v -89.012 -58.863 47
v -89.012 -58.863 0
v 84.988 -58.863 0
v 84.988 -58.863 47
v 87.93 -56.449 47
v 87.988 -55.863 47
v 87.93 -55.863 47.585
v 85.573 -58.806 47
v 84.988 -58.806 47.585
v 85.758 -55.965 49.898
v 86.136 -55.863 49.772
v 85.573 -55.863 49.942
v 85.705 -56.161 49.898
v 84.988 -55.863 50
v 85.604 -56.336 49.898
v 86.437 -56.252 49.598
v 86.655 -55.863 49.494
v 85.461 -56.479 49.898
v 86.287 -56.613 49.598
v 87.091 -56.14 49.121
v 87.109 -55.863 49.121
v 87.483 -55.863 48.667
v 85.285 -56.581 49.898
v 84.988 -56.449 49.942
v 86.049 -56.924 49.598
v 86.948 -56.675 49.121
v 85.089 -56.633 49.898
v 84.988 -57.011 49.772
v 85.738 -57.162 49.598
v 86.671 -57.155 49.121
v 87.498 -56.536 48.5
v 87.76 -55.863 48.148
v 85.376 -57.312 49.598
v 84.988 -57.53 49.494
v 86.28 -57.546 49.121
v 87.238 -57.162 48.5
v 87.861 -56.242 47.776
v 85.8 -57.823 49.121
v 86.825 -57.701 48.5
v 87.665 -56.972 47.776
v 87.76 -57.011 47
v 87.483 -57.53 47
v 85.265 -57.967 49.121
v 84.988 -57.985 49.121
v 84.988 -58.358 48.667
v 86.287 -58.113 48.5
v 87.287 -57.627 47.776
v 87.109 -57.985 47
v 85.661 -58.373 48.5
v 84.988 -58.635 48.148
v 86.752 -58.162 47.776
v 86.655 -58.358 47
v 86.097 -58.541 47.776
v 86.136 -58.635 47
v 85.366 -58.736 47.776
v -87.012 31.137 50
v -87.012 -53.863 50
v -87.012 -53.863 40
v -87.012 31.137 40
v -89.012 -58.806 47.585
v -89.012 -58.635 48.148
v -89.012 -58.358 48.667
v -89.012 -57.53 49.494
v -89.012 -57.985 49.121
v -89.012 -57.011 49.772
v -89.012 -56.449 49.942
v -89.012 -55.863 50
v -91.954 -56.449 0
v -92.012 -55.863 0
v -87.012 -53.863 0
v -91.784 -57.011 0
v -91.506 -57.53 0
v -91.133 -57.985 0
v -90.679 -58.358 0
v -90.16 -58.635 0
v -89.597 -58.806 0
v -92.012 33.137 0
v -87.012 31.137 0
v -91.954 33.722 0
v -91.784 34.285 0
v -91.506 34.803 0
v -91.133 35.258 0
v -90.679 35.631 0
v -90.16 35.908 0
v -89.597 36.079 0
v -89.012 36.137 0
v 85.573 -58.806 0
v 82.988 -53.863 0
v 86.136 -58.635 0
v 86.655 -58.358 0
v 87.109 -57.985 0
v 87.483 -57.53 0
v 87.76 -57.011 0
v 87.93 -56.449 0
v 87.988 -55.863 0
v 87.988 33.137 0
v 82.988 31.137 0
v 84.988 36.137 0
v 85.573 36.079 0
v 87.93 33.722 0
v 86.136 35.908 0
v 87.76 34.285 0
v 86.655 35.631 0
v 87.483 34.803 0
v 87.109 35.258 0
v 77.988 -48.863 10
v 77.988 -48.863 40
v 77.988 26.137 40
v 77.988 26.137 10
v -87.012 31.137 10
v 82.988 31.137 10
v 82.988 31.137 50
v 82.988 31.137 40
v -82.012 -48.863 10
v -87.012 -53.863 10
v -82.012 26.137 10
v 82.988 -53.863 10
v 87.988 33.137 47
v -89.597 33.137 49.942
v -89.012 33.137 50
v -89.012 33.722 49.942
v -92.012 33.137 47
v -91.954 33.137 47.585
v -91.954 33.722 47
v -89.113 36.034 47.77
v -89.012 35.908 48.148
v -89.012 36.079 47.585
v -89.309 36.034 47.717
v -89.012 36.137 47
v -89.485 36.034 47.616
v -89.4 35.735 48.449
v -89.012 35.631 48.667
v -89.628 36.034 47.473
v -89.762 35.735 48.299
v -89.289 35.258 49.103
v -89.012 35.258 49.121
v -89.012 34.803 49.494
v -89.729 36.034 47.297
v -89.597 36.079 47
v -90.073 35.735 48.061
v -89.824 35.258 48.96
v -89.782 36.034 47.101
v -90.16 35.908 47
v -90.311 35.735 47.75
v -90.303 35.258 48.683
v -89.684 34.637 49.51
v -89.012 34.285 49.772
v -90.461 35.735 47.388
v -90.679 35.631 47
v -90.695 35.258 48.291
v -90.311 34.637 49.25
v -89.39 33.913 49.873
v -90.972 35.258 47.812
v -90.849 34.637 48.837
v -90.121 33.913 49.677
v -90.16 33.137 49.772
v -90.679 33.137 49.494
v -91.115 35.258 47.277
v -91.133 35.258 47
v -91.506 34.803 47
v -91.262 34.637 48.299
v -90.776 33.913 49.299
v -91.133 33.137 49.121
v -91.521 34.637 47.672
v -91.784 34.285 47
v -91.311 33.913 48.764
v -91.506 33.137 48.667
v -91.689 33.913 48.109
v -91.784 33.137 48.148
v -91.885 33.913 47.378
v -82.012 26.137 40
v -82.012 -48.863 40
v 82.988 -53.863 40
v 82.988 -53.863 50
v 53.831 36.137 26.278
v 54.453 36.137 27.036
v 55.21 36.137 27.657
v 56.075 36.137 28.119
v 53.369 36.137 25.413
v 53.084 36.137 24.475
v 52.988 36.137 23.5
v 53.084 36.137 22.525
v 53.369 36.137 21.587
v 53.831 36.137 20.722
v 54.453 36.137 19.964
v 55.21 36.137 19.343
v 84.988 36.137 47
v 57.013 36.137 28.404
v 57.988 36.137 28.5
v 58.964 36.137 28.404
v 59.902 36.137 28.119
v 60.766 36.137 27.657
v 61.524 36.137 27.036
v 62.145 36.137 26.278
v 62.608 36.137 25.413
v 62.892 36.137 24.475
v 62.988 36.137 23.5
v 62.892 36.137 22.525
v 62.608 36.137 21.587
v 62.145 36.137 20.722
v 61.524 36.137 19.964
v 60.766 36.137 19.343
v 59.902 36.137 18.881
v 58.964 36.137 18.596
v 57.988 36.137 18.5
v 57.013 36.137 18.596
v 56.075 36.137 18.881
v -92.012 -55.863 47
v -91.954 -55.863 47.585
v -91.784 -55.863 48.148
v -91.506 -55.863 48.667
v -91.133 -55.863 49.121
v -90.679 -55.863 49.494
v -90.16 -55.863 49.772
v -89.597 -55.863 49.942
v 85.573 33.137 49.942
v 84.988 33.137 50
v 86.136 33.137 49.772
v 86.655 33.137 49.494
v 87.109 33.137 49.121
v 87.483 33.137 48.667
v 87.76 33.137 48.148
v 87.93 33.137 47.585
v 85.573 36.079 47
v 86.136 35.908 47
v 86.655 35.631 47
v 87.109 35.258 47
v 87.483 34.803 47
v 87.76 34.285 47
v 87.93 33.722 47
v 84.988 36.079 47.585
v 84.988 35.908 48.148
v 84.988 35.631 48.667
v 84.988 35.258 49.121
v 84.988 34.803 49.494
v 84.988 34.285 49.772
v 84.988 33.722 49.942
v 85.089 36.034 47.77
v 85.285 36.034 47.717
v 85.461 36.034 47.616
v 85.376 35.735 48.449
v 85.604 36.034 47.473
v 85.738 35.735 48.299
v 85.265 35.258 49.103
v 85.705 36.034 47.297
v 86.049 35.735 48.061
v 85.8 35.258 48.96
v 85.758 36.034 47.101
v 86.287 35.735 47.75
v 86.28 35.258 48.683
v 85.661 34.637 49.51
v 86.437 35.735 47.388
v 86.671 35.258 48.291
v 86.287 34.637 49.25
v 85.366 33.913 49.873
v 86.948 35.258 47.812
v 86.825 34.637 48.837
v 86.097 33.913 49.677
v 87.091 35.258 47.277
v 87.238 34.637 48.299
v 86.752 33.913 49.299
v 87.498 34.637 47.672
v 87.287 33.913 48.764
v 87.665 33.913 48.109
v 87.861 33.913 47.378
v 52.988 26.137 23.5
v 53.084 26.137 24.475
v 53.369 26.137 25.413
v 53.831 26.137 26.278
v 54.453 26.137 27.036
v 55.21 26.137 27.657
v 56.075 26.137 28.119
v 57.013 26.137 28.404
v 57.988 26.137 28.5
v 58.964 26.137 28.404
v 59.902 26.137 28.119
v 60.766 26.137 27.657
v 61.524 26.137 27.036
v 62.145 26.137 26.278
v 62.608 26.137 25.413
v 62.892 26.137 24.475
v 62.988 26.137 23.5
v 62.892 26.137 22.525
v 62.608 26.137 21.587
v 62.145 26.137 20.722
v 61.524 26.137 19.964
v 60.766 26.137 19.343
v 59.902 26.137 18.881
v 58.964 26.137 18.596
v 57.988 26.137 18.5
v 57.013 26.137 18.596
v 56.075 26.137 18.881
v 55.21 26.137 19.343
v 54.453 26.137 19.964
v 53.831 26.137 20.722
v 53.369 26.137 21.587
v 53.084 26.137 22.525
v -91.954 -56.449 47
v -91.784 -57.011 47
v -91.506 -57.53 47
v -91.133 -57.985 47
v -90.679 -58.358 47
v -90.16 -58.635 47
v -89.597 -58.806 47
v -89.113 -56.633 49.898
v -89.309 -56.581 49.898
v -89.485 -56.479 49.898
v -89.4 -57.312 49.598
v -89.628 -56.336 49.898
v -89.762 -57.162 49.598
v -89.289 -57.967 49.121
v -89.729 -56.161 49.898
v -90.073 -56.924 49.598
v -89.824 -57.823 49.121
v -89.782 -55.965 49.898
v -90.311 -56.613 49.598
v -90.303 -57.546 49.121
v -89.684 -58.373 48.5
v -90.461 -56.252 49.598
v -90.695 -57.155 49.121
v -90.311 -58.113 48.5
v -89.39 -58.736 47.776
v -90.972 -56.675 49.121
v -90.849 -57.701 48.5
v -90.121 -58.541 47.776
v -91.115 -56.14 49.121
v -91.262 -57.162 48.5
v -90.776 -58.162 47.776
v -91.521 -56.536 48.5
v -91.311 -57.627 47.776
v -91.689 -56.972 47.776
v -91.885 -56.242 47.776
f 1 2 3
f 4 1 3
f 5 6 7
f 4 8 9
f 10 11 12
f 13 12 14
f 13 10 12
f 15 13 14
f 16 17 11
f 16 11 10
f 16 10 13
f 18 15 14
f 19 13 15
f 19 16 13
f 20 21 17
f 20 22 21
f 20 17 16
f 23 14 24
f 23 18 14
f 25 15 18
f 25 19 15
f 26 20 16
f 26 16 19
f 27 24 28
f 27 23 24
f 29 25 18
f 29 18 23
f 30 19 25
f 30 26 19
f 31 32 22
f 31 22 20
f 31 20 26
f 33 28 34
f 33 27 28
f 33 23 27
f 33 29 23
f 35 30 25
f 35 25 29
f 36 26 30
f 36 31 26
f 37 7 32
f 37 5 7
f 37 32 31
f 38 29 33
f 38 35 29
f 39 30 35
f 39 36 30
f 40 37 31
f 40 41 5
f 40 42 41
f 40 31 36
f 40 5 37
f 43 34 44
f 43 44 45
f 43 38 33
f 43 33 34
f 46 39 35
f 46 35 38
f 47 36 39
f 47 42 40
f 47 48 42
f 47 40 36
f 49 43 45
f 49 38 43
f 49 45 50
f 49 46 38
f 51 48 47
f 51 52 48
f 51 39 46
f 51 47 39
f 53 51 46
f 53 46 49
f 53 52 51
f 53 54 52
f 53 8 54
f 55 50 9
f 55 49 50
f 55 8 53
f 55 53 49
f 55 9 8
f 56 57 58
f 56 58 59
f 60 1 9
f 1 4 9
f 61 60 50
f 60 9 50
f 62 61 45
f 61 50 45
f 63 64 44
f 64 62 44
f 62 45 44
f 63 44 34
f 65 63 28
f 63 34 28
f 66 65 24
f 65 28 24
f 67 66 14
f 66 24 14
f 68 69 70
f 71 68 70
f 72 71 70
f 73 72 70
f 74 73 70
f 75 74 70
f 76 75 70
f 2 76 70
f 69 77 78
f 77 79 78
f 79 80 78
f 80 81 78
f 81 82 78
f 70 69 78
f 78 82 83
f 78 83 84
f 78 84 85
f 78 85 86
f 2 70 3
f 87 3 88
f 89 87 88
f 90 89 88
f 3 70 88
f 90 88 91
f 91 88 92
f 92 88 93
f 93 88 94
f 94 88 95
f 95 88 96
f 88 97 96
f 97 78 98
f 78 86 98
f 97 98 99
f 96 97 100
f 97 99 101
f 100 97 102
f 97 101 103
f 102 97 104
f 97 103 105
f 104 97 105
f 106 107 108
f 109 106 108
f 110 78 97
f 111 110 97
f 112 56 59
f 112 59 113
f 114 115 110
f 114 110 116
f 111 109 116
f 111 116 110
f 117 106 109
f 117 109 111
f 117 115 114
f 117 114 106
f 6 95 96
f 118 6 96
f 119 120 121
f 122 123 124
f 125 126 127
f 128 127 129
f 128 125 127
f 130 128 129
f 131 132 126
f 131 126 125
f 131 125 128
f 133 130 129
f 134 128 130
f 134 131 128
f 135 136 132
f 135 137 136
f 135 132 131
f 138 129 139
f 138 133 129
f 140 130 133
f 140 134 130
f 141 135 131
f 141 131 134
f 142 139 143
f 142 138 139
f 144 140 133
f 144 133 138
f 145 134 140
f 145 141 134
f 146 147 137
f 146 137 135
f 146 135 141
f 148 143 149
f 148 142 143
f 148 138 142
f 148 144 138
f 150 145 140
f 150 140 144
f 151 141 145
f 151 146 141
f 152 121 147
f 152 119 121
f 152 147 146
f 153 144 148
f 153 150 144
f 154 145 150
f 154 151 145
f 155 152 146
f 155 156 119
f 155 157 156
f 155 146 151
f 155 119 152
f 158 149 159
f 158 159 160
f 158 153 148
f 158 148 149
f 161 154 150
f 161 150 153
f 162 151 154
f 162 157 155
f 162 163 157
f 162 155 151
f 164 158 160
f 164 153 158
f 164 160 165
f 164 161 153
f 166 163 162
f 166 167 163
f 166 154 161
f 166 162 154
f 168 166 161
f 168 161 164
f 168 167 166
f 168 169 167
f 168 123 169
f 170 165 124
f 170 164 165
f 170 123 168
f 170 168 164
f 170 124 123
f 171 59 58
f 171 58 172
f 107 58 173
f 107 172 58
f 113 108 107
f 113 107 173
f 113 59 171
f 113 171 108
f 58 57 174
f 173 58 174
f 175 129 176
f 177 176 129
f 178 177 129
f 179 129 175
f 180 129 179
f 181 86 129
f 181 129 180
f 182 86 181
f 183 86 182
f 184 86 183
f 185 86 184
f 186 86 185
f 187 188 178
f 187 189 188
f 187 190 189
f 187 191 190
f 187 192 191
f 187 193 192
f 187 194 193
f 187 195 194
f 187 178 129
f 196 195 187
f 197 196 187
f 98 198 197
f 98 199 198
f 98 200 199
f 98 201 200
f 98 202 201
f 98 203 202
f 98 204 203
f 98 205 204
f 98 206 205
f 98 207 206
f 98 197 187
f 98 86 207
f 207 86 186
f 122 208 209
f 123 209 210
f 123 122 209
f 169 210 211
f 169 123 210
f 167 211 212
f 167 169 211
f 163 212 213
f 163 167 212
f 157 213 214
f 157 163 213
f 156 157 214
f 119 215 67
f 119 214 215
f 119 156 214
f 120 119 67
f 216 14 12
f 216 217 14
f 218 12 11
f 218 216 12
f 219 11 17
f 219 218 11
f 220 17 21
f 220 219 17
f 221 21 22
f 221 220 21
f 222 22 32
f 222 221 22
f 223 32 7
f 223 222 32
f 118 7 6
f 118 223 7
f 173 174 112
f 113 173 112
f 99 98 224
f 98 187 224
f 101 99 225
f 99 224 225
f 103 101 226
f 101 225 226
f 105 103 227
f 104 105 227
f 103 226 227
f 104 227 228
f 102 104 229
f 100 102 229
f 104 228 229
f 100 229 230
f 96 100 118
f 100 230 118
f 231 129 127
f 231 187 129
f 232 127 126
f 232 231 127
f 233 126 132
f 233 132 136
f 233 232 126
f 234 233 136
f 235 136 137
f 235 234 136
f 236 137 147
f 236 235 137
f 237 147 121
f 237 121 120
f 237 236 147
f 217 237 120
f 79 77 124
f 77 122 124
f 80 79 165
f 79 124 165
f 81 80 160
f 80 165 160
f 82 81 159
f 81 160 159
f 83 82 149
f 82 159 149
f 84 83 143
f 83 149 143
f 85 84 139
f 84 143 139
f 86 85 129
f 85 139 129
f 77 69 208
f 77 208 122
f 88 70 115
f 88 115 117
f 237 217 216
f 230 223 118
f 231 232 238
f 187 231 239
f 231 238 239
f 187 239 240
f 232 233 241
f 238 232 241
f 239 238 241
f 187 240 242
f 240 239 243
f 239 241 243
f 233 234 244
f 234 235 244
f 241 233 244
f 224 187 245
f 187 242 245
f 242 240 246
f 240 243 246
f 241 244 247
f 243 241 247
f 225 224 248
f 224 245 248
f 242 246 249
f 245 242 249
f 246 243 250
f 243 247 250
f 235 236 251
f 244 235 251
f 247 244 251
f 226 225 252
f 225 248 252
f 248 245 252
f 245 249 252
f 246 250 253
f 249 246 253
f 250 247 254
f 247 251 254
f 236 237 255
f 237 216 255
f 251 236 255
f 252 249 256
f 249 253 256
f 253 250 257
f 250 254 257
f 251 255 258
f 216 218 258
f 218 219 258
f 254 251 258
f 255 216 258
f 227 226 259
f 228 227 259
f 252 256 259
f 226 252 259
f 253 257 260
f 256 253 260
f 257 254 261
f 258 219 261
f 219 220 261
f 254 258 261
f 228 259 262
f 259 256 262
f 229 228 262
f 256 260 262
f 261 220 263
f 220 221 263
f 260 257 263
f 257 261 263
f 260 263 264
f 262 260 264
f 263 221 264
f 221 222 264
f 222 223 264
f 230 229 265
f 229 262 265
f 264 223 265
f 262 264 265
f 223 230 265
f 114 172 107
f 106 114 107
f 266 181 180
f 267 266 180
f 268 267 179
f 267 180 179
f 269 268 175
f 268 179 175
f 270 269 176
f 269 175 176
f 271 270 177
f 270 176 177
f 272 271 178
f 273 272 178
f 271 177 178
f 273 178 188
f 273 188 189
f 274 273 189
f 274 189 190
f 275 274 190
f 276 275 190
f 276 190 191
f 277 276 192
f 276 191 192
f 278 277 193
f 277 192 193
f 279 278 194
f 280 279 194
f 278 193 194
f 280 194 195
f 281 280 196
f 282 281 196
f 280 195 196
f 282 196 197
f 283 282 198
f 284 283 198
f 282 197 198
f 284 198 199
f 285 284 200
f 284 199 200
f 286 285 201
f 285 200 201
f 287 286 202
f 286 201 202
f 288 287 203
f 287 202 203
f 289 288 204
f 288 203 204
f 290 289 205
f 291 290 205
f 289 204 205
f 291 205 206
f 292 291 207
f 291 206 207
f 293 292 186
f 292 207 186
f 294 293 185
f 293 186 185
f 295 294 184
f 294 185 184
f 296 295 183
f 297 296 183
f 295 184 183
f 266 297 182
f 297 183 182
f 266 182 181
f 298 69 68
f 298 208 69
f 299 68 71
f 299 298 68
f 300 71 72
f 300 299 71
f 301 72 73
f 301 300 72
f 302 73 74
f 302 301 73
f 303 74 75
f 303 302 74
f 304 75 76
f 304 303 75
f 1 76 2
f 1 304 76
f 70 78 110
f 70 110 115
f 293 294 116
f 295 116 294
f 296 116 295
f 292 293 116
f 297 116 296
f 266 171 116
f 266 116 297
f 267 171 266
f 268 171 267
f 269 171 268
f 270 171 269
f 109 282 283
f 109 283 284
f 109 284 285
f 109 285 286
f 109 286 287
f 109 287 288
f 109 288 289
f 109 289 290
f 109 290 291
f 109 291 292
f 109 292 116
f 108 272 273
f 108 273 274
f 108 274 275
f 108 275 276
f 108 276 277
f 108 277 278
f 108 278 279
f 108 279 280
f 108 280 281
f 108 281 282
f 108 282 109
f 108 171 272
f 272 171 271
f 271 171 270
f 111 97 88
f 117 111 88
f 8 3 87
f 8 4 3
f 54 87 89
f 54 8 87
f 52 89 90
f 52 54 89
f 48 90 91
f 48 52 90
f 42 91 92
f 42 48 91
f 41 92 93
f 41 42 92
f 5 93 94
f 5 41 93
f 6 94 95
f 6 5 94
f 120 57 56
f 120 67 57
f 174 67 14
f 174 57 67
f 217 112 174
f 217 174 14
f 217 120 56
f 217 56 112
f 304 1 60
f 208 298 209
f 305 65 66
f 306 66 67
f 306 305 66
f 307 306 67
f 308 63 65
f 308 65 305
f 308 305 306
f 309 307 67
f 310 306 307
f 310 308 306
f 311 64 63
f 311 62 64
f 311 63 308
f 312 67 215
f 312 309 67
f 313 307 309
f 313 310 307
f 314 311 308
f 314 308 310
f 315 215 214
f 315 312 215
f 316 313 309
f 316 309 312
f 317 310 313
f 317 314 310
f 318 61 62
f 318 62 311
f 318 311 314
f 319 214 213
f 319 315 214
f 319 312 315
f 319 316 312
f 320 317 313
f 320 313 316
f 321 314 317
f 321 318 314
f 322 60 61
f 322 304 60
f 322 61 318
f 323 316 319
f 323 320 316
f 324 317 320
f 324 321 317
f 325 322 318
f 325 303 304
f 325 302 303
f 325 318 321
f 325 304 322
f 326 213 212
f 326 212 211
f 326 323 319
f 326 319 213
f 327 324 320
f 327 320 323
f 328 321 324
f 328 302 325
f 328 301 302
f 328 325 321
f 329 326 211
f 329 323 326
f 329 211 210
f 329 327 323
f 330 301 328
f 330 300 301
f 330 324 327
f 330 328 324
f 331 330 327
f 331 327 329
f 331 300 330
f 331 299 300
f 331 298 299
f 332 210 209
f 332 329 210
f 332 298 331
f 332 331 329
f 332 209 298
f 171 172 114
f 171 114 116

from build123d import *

# Parameters (mm, degrees)
F0_W      = 180
F0_H      = 95
F1_DEPTH  = 50
F2_W      = 160
F2_H      = 75
F3_DEPTH  = 50.001
F4_W      = 170
F4_H      = 85
F5_DEPTH  = 10
F6_W      = 170
F6_H      = 85
F7_DEPTH  = 10
F8_R      = 3
F9_R      = 5
F10_DEPTH = 10


with BuildPart() as f1:
    # F0 (on Top) → F1 (new body)
    with BuildSketch(Plane.XY):
        with Locations((-2.011862, -11.363395)):
            Rectangle(F0_W, F0_H)
    extrude(amount=F1_DEPTH)

    # F2 (on face) → F3 (cut, through all)
    with BuildSketch(Plane.XY.offset(50)):
        with Locations((-2.011862, -11.363395)):
            Rectangle(F2_W, F2_H)
    extrude(amount=-F3_DEPTH, mode=Mode.SUBTRACT)

    # F4 (on face) → F5 (cut)
    with BuildSketch(Plane.XY.offset(50)):
        with Locations((-2.011862, -11.363395)):
            Rectangle(F4_W, F4_H)
    extrude(amount=-F5_DEPTH, mode=Mode.SUBTRACT)

    # F6 (on face) → F7 (cut)
    with BuildSketch(Plane(origin=(0, 0, 0), x_dir=(1, 0, 0), z_dir=(0, 0, -1))):
        with Locations((-2.011862, 11.363395)):
            Rectangle(F6_W, F6_H)
    extrude(amount=-F7_DEPTH, mode=Mode.SUBTRACT)

    # F8
    f8_edges = [f1.edges().sort_by_distance(p)[0] for p in [
        (-92.011862, -58.863395, 25),
        (87.988138, -58.863395, 25),
        (87.988138, -11.363395, 50),
        (-2.011862, -58.863395, 50),
        (-92.011862, -11.363395, 50),
        (-2.011862, 36.136605, 50),
        (-92.011862, 36.136605, 25),
        (87.988138, 36.136605, 25),
    ]]
    fillet(f8_edges, radius=F8_R)

    # F9 (on face) → F10 (cut, through all)
    with BuildSketch(Plane(origin=(0, 36.136605, 0), x_dir=(-1, 0, 0), z_dir=(0, 1, 0))):
        with Locations((-57.988138, 23.5)):
            Circle(F9_R)
    extrude(amount=-F10_DEPTH, mode=Mode.SUBTRACT)


solid = f1.part
